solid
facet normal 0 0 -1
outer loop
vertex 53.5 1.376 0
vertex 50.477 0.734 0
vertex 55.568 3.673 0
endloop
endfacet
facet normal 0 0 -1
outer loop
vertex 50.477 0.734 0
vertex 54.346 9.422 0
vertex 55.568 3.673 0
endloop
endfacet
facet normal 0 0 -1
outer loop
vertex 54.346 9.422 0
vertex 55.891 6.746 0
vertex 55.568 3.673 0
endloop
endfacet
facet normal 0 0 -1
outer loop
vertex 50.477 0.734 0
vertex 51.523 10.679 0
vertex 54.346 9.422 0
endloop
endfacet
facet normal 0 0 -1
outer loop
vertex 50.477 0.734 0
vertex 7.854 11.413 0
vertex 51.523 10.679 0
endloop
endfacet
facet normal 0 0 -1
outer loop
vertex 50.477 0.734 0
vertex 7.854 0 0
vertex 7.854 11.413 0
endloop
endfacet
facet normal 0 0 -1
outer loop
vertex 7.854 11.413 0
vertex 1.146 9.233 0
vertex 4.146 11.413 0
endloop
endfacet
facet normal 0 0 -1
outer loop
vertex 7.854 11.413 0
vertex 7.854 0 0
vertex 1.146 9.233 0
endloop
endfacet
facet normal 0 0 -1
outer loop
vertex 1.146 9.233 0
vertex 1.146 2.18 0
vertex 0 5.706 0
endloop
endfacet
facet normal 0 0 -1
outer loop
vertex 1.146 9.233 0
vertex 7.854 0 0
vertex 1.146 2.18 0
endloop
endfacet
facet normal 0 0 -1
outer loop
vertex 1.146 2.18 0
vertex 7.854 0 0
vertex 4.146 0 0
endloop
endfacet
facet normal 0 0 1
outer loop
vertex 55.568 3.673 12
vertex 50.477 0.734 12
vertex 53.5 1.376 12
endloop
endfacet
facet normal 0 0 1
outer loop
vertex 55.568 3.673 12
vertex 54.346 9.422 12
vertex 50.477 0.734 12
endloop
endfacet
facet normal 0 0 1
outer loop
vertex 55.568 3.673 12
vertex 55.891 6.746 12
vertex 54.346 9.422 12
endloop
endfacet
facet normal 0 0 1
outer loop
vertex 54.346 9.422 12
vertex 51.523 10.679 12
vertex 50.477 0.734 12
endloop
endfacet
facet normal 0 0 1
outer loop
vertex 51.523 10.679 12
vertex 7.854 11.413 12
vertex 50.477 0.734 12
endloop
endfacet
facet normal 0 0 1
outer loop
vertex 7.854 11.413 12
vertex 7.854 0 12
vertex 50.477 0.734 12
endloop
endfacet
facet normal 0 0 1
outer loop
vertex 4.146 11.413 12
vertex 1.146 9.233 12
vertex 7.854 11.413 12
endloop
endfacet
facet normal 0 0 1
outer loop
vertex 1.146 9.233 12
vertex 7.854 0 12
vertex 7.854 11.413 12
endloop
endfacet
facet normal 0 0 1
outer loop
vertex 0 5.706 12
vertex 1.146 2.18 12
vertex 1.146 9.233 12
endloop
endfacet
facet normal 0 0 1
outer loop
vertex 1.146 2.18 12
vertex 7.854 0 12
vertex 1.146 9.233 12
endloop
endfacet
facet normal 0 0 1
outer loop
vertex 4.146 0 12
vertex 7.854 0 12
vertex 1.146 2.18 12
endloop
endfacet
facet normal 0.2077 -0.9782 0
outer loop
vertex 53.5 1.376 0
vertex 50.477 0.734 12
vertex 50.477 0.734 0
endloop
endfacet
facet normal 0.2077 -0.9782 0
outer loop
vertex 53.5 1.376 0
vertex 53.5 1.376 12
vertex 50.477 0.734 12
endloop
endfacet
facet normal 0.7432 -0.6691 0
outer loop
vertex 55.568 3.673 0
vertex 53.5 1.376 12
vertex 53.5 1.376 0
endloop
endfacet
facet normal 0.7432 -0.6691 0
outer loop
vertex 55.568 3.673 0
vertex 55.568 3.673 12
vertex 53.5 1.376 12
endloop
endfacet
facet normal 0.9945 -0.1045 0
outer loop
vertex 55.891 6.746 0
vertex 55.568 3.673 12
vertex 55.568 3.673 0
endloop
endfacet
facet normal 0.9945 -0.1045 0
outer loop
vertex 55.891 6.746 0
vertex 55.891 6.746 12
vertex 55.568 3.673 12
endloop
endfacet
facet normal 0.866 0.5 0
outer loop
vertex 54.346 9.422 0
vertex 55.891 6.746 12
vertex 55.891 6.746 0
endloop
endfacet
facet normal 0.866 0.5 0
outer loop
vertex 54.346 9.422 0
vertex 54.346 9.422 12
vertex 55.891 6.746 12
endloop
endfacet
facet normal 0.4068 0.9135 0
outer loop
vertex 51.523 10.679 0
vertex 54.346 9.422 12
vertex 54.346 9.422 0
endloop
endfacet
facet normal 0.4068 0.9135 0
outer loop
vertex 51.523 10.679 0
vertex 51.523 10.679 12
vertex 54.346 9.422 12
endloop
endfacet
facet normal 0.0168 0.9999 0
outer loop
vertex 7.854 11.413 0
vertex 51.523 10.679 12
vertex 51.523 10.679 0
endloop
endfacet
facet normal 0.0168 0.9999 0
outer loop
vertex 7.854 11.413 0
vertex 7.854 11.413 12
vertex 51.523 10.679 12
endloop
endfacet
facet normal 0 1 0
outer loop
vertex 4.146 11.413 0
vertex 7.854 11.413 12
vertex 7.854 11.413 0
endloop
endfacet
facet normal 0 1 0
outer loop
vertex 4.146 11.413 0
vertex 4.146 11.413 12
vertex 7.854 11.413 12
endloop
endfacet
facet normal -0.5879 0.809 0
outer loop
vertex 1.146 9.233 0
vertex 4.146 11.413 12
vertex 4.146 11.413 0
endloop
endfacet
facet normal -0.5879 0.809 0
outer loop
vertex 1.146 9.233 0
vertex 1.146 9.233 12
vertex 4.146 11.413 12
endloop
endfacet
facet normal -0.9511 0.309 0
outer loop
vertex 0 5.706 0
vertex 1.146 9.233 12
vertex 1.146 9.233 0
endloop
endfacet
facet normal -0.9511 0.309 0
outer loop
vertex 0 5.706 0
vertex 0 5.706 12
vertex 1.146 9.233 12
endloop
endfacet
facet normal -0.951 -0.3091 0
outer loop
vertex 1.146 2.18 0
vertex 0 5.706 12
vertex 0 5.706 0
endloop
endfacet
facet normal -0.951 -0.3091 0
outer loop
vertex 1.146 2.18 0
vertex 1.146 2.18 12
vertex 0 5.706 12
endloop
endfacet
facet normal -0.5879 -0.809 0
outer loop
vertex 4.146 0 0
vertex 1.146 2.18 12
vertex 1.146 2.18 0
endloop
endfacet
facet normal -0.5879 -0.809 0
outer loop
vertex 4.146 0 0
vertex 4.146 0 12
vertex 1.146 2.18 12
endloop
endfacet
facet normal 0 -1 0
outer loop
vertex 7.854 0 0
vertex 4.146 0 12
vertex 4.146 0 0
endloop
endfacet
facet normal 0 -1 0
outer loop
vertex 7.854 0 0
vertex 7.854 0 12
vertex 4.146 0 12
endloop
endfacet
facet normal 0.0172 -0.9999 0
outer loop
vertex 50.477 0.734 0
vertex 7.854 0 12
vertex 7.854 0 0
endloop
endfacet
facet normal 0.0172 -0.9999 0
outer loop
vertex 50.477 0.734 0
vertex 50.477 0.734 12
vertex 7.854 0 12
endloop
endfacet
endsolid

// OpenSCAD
$fn = 32;

// ----------------------------------------------------------------------
// Lever arm: two bosses 12 and 10 mm, 45 mm between centres
// ----------------------------------------------------------------------

// --- parameters (mm) ---
profile_height = 12;      // extrusion height
profile_points = 13;      // points of the closed outline

profile = [[0, 5.706], [1.146, 2.18], [4.146, 0], [7.854, 0], [50.477, 0.734], [53.5, 1.376], [55.568, 3.673], [55.891, 6.746], [54.346, 9.422], [51.523, 10.679], [7.854, 11.413], [4.146, 11.413], [1.146, 9.233]];  // single closed polygon, 13 points, counter clockwise

// --- the one profile operation ---
linear_extrude(height = profile_height) polygon(points = profile);
